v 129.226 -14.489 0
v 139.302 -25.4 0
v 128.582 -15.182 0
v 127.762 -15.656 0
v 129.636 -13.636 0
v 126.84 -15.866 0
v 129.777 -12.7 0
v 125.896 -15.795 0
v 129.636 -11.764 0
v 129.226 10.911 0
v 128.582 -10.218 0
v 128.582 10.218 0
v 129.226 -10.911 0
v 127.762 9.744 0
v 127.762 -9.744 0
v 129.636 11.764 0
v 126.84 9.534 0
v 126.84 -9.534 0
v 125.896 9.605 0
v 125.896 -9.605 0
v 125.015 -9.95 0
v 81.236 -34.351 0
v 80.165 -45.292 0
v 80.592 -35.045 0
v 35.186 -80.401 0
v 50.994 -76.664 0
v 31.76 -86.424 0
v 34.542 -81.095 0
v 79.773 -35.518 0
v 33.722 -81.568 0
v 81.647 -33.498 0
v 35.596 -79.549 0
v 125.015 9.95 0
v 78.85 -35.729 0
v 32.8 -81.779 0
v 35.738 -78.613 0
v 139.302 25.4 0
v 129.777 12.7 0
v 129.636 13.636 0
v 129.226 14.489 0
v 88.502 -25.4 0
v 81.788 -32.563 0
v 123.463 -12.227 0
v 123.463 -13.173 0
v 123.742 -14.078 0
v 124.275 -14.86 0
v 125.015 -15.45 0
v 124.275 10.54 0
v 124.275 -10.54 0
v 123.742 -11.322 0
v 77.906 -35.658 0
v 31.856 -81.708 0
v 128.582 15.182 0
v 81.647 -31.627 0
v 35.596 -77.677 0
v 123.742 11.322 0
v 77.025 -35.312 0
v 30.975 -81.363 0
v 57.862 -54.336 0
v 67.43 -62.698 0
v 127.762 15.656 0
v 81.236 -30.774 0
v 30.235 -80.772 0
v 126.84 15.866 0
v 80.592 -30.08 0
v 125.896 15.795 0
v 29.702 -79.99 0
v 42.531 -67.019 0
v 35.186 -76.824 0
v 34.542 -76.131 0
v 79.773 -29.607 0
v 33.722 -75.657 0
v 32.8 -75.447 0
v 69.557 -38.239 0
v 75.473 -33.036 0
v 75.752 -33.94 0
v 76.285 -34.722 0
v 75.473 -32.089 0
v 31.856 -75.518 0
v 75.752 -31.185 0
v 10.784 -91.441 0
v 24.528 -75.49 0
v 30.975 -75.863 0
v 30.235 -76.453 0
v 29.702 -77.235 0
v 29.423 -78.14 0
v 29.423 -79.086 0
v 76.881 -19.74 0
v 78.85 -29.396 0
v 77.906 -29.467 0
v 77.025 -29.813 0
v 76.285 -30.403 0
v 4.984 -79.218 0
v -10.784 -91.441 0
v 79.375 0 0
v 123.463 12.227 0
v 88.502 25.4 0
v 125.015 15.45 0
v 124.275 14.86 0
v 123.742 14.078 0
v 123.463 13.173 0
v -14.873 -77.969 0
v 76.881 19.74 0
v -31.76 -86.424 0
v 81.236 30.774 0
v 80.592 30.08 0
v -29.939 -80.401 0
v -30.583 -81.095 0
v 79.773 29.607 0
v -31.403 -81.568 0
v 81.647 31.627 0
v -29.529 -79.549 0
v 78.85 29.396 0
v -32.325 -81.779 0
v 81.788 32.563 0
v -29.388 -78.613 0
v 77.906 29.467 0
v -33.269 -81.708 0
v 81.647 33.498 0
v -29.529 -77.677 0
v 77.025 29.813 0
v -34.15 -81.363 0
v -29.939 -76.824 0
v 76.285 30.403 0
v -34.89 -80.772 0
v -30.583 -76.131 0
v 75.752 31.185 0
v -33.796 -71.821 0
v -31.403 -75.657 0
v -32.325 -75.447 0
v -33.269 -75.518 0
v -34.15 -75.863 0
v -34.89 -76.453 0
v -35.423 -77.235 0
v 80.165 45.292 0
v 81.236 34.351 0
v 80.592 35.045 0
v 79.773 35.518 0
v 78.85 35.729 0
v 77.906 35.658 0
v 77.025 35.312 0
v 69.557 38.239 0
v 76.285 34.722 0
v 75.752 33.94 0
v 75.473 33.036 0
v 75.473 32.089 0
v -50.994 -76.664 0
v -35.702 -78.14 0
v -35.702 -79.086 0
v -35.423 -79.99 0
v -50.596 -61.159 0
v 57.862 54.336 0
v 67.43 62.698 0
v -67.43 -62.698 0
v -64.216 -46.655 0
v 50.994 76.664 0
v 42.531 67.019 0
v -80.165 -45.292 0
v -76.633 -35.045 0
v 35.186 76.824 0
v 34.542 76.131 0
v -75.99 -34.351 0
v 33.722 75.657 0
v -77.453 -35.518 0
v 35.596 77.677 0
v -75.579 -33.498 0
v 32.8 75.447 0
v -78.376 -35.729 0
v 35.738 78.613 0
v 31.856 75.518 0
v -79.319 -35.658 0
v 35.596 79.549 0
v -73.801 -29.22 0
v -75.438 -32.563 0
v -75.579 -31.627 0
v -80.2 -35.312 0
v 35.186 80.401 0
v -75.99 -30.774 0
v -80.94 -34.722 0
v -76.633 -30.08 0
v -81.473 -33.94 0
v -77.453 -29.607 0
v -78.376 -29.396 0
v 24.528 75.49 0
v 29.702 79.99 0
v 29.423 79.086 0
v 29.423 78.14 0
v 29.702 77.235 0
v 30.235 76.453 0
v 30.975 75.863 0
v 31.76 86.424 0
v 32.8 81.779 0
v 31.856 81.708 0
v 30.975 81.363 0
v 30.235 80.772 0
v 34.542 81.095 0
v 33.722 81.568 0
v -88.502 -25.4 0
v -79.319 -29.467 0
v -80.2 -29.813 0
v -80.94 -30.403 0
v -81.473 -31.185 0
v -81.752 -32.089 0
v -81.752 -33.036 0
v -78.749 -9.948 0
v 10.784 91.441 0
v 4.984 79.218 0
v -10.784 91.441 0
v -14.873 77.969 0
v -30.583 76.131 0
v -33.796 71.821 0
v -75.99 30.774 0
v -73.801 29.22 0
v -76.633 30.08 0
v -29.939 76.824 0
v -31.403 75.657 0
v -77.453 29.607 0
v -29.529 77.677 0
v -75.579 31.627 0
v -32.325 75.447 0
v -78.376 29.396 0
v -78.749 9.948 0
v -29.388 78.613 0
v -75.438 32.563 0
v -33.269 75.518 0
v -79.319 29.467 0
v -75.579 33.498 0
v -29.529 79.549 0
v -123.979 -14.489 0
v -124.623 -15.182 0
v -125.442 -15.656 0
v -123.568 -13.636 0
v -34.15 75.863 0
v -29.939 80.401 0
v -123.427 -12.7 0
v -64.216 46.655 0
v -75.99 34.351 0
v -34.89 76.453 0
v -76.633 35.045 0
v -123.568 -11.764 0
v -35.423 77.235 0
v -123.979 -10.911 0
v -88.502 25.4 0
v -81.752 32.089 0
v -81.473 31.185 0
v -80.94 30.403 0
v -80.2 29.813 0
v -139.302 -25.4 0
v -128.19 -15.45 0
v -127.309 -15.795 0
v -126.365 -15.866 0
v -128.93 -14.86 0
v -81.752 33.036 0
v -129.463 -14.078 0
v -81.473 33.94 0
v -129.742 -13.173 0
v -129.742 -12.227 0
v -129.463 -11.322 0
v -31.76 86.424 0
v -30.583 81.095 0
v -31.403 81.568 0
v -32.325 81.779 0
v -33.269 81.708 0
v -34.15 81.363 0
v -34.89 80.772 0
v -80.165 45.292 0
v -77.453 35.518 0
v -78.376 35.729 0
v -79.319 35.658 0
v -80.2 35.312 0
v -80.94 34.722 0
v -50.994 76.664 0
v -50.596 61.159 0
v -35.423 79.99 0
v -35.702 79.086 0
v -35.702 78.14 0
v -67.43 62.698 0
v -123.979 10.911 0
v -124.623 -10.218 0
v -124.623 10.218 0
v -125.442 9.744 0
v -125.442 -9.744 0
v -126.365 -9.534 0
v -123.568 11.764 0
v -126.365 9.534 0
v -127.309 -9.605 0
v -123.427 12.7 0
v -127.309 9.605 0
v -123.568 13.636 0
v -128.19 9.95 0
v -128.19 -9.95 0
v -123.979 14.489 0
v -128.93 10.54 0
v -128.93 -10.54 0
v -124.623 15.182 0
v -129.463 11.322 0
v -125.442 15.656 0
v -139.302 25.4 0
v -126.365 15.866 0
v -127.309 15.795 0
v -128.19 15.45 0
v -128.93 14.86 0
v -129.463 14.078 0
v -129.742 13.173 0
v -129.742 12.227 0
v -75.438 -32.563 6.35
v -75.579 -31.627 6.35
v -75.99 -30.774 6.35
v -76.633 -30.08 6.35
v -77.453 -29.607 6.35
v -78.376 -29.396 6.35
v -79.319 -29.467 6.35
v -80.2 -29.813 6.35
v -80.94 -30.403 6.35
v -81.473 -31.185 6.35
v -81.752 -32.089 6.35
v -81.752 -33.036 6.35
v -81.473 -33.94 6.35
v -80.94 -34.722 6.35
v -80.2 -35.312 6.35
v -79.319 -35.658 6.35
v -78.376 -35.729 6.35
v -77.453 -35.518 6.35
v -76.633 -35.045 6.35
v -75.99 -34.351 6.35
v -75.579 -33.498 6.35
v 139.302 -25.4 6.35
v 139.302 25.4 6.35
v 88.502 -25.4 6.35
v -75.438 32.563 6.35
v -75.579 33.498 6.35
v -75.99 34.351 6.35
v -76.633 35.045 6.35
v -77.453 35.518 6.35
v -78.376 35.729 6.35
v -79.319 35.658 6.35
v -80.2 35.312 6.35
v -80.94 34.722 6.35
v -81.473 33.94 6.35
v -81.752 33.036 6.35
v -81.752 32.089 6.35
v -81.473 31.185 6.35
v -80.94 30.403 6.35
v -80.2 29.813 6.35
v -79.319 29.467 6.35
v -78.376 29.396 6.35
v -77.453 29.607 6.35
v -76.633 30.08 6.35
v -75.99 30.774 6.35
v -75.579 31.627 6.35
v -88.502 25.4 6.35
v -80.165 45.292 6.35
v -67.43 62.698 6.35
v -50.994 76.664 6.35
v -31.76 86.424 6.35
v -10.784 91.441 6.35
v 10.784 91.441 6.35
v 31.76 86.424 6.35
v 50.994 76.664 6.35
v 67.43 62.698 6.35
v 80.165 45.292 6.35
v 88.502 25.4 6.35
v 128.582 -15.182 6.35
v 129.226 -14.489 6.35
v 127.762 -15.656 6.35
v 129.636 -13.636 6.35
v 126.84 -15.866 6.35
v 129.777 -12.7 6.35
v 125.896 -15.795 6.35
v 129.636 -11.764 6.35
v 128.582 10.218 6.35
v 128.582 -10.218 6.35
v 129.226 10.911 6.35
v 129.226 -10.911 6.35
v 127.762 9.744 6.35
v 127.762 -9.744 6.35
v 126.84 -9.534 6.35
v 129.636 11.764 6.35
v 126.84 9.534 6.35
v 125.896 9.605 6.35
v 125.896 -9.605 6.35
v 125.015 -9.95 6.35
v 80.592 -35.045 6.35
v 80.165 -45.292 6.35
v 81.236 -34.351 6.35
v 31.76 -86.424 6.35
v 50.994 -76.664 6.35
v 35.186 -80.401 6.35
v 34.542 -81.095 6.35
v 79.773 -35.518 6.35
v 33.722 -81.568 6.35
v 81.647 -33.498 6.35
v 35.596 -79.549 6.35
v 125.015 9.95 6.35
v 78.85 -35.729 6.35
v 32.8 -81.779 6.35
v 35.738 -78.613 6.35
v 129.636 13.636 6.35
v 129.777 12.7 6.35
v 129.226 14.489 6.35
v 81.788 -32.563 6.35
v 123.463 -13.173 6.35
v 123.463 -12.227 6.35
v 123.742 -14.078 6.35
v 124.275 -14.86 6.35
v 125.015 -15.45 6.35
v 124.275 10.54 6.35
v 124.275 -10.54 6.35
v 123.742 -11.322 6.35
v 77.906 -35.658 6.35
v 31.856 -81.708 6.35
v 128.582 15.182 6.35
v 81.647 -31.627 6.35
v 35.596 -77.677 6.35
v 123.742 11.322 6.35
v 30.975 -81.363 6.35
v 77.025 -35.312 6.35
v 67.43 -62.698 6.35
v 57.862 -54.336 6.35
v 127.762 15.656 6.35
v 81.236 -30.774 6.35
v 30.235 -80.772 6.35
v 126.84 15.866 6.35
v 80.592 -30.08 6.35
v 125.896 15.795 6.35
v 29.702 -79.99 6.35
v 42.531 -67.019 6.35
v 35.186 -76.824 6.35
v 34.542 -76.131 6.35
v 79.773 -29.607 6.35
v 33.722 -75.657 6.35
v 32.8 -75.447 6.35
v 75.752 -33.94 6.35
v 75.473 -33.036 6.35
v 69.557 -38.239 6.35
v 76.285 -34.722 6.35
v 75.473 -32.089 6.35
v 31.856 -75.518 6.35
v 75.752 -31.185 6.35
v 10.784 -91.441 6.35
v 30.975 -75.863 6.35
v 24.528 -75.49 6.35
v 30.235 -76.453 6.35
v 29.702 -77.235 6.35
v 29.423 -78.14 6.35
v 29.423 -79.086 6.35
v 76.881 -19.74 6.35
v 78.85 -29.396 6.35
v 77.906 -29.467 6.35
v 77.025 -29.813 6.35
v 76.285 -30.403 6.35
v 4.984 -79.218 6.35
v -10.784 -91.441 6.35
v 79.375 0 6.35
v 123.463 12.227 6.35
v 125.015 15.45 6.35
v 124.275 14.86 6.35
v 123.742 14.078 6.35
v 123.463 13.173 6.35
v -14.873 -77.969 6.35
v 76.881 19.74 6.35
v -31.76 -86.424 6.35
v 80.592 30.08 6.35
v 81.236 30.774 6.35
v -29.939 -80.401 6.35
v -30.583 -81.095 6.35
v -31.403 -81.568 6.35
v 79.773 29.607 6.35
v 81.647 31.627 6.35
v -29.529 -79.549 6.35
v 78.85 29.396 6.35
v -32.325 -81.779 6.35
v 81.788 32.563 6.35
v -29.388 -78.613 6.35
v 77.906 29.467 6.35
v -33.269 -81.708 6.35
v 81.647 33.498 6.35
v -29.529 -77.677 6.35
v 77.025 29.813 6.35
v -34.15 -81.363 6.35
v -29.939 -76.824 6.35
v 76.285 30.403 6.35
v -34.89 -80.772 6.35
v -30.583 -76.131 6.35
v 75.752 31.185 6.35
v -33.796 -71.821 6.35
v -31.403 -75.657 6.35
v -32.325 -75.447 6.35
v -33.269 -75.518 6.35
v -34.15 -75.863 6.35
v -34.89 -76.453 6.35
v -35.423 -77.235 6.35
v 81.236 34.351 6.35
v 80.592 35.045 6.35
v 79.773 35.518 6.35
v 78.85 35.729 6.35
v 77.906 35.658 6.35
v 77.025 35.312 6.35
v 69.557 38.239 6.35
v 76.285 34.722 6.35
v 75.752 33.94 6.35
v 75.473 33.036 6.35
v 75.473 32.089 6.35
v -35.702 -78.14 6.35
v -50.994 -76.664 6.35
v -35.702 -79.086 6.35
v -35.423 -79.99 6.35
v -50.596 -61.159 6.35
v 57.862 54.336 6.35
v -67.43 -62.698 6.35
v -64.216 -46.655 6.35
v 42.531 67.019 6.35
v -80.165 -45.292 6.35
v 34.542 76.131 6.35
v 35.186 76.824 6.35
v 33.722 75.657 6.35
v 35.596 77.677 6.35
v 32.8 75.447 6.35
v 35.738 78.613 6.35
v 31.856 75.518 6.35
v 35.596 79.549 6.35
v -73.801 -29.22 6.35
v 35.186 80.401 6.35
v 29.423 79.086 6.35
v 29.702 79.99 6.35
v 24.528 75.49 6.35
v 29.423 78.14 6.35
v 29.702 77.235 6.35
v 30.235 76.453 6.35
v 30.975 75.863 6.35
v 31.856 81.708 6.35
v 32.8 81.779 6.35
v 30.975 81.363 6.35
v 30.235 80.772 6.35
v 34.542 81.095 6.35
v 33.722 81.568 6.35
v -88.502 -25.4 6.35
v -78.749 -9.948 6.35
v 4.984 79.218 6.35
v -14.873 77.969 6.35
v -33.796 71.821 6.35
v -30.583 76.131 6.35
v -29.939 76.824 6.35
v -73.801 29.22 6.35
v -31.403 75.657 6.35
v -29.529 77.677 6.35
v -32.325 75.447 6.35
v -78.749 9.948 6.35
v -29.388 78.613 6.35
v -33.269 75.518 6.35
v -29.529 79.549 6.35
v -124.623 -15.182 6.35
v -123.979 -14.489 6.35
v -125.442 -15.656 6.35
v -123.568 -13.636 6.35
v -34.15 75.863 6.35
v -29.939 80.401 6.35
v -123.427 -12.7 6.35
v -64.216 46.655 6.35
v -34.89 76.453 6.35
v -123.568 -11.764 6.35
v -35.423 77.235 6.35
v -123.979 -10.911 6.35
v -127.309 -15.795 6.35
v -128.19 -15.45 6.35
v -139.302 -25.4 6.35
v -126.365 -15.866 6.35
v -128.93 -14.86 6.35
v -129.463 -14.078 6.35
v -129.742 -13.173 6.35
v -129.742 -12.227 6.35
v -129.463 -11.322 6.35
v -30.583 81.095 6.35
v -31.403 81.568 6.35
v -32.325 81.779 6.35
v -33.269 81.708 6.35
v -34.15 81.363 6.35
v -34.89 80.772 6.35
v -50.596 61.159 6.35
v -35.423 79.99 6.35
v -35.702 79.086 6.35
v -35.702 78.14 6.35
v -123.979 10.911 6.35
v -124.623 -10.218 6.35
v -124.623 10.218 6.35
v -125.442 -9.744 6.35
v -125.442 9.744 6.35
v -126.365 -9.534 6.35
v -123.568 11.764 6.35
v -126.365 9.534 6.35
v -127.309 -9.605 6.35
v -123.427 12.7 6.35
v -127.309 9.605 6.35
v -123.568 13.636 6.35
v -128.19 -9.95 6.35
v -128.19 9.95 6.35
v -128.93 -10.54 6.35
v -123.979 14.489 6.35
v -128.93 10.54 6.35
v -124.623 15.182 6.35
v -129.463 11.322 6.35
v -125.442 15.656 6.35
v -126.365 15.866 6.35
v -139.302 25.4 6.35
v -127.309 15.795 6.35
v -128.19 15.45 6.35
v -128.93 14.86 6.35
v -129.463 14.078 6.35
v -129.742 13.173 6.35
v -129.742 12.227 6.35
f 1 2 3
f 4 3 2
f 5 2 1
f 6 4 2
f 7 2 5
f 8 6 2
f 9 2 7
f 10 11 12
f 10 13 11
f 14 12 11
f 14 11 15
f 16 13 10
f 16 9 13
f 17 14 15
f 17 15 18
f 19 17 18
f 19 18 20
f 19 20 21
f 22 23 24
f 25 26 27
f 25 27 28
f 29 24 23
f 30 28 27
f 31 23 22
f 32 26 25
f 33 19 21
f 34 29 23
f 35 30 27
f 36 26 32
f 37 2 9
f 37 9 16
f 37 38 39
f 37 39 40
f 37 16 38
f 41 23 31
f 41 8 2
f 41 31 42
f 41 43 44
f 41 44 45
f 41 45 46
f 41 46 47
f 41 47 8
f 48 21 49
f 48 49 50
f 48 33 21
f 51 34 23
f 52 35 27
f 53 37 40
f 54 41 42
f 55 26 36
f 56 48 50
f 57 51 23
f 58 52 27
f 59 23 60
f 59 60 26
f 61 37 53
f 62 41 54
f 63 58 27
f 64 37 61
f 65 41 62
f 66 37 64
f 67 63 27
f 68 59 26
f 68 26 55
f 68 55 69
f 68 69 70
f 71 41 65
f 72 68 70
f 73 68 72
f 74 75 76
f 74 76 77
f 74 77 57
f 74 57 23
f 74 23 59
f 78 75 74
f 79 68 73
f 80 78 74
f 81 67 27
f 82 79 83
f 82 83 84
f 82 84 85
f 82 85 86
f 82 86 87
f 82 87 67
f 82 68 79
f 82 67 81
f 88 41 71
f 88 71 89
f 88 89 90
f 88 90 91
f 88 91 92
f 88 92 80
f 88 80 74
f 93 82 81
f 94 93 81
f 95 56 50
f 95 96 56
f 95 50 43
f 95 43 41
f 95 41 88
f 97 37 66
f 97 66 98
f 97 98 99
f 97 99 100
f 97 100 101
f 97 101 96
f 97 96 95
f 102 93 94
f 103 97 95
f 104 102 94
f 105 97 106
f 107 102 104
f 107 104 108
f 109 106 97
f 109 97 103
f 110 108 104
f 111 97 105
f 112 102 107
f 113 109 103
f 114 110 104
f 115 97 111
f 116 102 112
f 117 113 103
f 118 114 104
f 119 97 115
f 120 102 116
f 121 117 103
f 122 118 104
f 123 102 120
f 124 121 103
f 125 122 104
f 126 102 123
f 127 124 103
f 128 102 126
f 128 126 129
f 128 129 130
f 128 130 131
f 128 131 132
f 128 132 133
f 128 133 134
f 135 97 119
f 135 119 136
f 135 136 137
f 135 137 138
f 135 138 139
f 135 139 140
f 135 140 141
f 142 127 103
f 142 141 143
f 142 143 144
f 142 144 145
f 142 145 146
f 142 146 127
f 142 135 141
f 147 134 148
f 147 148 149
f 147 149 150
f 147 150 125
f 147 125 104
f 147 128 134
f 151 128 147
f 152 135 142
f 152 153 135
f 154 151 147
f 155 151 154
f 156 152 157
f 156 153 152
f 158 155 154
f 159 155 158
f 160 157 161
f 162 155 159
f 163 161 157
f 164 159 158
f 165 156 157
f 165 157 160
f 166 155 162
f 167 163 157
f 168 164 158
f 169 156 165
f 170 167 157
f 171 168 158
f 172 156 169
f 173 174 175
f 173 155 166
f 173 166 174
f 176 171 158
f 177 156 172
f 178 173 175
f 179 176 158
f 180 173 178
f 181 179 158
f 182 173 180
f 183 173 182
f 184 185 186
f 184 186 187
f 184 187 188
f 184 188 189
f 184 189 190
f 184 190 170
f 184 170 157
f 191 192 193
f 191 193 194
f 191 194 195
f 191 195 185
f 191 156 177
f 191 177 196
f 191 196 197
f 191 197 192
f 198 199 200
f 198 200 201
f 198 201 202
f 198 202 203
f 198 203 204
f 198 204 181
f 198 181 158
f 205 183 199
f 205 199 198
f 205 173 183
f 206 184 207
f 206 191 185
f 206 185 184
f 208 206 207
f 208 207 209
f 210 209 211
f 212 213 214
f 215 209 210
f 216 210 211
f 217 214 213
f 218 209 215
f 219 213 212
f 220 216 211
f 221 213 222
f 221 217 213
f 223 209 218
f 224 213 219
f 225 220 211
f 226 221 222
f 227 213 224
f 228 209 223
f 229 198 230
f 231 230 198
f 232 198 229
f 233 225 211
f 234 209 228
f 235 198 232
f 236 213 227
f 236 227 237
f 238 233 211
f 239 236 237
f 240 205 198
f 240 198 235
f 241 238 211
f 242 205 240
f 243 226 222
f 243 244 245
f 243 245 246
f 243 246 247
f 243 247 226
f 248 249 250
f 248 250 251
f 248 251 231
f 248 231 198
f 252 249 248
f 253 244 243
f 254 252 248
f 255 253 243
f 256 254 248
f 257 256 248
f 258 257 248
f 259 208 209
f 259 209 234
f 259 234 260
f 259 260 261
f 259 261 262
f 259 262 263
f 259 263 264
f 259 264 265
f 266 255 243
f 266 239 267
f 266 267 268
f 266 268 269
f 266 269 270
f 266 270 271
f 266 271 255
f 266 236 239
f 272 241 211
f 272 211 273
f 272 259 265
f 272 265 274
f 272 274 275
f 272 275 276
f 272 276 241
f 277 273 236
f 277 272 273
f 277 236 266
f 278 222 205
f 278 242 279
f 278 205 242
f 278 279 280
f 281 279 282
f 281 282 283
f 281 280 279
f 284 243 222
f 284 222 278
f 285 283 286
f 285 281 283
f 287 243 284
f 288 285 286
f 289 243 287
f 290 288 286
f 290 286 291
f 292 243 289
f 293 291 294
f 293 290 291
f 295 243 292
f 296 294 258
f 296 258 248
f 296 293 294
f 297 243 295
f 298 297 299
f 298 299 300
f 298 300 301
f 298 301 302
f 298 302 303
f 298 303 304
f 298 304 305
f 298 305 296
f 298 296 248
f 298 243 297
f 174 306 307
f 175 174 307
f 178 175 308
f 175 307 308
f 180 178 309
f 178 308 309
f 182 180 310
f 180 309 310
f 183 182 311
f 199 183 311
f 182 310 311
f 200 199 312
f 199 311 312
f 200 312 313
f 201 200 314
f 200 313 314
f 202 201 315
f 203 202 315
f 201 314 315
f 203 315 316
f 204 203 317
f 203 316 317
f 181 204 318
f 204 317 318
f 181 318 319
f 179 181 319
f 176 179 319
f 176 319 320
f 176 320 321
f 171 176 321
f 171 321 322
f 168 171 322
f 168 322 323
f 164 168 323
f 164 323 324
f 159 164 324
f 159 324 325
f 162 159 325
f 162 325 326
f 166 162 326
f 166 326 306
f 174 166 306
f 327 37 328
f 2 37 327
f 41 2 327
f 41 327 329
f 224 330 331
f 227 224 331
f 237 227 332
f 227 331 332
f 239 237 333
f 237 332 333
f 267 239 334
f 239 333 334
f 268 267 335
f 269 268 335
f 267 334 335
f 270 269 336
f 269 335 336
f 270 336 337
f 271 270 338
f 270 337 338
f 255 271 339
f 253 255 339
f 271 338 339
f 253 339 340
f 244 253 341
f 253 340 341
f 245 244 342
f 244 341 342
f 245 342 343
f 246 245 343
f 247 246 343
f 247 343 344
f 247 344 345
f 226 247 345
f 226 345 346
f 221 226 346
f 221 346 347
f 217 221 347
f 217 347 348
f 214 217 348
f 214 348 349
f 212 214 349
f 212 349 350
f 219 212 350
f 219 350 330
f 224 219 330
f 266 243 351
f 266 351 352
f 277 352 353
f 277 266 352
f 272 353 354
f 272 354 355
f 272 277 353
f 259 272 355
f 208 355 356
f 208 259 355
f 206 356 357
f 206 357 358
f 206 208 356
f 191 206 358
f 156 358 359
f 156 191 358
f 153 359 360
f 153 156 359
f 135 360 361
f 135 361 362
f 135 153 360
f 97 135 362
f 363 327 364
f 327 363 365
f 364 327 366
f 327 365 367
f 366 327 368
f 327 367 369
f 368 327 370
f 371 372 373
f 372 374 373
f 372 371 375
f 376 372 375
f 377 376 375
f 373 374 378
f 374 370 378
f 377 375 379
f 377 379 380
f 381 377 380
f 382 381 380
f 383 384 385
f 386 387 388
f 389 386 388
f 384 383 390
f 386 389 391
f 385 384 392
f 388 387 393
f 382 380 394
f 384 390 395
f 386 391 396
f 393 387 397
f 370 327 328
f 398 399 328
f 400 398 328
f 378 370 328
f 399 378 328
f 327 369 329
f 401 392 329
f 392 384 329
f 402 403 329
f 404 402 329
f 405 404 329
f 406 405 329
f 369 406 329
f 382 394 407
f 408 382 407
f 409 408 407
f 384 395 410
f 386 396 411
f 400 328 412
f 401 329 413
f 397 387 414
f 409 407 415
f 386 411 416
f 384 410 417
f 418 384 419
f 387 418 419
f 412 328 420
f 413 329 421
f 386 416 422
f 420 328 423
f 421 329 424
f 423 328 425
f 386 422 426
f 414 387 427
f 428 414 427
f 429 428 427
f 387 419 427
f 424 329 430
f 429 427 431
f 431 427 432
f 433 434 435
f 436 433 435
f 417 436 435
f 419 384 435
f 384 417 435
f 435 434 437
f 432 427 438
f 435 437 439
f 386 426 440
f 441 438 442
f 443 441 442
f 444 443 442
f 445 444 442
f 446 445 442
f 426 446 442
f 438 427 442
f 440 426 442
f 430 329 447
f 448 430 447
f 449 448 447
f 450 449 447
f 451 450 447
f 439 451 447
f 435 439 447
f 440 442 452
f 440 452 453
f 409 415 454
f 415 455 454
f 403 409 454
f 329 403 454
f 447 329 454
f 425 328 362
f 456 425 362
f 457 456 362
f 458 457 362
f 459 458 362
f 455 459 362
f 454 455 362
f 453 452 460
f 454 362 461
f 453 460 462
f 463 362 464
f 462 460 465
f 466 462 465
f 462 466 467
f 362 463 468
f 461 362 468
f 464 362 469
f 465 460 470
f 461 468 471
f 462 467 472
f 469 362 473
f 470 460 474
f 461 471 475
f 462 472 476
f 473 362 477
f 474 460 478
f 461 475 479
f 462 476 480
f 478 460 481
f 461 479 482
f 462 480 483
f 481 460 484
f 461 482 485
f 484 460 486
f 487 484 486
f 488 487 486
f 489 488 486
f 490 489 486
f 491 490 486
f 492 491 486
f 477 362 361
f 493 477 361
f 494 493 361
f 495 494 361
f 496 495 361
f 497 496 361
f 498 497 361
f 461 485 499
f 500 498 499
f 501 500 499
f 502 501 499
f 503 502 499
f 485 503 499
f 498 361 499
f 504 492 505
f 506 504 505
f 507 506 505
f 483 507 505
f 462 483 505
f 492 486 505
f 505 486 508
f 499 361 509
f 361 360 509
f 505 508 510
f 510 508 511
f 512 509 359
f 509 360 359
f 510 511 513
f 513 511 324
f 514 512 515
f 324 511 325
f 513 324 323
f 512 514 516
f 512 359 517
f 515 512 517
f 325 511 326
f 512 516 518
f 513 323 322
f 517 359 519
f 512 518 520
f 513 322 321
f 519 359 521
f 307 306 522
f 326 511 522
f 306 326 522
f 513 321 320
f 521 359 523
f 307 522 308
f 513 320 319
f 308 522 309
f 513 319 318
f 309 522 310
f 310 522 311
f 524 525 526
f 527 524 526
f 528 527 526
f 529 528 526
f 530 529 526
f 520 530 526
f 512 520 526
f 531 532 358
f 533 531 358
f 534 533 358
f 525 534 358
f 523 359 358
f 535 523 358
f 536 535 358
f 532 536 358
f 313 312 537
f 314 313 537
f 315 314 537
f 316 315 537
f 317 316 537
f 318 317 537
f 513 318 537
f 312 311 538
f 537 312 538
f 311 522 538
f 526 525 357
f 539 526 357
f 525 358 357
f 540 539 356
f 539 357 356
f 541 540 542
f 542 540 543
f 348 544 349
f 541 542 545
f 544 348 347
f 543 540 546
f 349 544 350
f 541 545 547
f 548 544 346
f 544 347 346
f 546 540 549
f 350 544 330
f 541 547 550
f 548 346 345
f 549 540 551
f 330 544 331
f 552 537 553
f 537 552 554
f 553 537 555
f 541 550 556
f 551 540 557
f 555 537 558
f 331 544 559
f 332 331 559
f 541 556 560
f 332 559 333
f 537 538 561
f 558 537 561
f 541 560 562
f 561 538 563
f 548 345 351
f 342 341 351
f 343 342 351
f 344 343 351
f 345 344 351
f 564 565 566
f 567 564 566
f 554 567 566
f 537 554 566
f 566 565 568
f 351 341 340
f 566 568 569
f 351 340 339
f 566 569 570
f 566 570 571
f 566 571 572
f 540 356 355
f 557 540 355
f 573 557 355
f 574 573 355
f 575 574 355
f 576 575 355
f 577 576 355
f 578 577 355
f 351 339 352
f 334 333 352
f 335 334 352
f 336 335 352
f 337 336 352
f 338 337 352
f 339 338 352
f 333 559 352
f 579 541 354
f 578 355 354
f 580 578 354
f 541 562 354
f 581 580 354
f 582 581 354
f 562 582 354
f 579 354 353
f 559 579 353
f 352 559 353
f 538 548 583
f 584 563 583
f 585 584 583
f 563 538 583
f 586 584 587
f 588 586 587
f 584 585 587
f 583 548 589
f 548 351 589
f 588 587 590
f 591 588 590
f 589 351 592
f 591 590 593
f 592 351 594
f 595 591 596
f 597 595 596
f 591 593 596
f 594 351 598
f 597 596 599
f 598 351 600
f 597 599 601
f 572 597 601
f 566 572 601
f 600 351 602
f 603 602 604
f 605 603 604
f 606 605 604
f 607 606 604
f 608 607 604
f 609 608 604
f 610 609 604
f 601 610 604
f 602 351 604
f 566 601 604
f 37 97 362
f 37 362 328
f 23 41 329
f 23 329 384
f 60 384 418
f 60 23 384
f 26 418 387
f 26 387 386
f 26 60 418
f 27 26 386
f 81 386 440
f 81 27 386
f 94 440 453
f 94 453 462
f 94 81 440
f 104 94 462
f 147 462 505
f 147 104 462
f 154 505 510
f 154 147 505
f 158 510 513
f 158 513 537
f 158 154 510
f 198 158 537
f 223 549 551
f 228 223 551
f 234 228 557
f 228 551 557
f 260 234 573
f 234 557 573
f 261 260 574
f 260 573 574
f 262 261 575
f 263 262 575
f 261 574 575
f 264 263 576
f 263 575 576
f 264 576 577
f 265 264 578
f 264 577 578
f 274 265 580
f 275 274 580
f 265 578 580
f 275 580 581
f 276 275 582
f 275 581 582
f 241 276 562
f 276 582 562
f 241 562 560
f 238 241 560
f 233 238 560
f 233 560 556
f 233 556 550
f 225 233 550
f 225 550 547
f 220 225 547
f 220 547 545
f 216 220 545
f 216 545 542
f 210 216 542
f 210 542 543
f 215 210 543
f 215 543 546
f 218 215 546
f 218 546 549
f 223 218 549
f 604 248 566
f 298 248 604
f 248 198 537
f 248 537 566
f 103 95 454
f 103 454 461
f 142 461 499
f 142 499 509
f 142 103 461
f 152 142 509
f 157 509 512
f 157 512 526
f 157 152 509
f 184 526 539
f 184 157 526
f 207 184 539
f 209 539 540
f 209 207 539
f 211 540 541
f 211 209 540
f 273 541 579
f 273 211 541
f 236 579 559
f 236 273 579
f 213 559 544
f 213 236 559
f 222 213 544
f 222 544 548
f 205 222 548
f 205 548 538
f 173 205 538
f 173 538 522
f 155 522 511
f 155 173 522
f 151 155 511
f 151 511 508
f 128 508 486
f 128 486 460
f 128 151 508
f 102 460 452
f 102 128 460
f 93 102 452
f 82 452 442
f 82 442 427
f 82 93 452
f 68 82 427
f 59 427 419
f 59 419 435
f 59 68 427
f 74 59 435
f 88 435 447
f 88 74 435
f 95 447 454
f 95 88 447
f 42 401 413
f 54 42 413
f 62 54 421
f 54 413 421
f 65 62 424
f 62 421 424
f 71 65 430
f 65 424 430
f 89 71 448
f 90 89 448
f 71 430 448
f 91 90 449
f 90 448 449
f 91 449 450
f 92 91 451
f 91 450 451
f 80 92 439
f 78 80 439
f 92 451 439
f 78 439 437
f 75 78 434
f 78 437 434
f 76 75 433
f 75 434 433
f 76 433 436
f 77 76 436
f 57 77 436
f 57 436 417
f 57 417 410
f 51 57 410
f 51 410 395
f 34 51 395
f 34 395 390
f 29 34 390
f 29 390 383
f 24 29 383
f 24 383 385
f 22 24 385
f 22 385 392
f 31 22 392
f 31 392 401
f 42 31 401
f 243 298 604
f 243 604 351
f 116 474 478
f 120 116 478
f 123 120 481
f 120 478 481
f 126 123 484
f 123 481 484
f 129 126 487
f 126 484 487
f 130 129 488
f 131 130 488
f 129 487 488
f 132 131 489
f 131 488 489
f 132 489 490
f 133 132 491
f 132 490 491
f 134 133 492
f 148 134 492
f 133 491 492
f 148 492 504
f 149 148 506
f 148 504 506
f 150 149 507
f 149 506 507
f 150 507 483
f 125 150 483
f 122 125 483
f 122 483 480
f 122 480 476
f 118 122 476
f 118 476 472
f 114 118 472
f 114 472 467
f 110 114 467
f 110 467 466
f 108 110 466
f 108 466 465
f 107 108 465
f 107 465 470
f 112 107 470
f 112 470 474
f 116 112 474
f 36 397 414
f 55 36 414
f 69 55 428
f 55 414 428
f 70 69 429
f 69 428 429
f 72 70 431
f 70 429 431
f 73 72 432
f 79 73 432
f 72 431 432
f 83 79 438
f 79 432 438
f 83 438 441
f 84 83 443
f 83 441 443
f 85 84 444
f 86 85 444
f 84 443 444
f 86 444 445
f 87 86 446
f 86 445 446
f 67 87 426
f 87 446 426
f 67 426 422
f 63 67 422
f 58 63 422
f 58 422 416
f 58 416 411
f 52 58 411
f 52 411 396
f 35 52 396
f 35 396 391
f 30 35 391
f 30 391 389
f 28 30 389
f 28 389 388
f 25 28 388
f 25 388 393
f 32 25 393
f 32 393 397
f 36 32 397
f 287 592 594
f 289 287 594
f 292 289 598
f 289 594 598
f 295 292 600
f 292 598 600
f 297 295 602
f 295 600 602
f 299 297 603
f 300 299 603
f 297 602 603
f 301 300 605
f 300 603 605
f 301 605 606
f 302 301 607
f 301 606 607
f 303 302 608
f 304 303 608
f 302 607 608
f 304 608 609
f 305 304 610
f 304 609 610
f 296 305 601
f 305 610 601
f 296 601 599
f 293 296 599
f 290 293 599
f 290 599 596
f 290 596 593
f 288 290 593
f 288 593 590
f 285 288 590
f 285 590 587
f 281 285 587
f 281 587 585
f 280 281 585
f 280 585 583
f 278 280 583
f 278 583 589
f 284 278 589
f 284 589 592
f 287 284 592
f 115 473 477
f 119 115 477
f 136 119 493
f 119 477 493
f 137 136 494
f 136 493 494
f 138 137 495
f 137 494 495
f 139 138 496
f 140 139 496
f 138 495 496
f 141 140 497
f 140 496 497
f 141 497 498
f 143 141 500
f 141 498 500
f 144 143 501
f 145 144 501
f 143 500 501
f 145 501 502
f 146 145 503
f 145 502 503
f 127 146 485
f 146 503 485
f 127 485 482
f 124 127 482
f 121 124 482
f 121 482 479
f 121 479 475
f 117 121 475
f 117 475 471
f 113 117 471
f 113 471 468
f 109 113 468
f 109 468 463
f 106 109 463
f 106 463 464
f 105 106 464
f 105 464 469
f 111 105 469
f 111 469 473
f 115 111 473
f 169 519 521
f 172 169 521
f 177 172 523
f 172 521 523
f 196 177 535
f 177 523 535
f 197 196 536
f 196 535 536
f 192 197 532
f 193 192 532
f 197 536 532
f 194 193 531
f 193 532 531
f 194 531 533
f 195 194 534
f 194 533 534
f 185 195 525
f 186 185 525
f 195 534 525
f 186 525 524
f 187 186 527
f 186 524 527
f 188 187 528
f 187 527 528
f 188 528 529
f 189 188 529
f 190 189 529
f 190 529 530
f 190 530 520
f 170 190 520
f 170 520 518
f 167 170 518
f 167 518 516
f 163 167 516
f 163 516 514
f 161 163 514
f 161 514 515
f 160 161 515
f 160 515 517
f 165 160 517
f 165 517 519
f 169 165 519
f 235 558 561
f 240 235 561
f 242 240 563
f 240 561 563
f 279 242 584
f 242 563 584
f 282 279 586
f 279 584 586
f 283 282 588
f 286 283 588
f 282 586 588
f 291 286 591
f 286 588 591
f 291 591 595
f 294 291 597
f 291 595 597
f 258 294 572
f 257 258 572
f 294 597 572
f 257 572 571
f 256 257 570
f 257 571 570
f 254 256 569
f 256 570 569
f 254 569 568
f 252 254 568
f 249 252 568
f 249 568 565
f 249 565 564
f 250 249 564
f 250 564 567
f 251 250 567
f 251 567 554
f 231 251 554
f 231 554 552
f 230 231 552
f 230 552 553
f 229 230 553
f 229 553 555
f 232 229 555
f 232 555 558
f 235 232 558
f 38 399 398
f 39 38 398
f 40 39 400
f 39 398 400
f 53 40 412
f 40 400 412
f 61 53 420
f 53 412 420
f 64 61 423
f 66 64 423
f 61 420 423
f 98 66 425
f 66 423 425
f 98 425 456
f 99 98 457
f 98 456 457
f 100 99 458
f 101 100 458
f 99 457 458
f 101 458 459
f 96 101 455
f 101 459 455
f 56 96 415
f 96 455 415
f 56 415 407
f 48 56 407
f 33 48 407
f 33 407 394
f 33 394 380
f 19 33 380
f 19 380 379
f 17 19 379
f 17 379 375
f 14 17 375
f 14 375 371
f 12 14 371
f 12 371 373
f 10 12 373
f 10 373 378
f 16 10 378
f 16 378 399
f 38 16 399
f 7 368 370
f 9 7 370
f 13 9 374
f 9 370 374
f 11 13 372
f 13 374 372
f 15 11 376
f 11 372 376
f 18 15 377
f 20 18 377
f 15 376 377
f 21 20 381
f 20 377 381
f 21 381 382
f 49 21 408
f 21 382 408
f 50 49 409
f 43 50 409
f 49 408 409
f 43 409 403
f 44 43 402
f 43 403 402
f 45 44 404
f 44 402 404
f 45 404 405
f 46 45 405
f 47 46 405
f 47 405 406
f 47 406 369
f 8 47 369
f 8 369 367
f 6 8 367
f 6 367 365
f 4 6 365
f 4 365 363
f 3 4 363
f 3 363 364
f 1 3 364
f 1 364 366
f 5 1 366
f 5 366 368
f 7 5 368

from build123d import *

# Parameters (mm, degrees)
SKETCH1_R           = 79.375
BOSS_EXTRUDE1_DEPTH = 6.35
SKETCH2_R           = 3.175
CUT_EXTRUDE1_DEPTH  = 76.2


with BuildPart() as part:
    # Sketch1 → Boss-Extrude1 (new body)
    with BuildSketch(Plane.XY):
        with BuildLine():
            Line((-139.302235141, 25.4), (-88.502235141, 25.4))
            ThreePointArc((-88.502235141, 25.4), (0, 92.075), (88.502235141, 25.4))
            Line((88.502235141, 25.4), (139.302235141, 25.4))
            Line((139.302235141, 25.4), (139.302235141, -25.4))
            Line((139.302235141, -25.4), (88.502235141, -25.4))
            ThreePointArc((88.502235141, -25.4), (0, -92.075), (-88.502235141, -25.4))
            Line((-88.502235141, -25.4), (-139.302235141, -25.4))
            Line((-139.302235141, -25.4), (-139.302235141, 25.4))
        make_face()
        Circle(SKETCH1_R, mode=Mode.SUBTRACT)
    extrude(amount=BOSS_EXTRUDE1_DEPTH)

    # Sketch2 → Cut-Extrude1 (cut)
    with BuildSketch(Plane.XY.offset(6.35)):
        with Locations((-126.602235141, -12.7)):
            Circle(SKETCH2_R)
        with Locations((-78.612909421, -32.56253326)):
            Circle(SKETCH2_R)
        with Locations((78.612909421, -32.56253326)):
            Circle(SKETCH2_R)
        with Locations((126.602235141, 12.7)):
            Circle(SKETCH2_R)
        with Locations((126.602235141, -12.7)):
            Circle(SKETCH2_R)
        with Locations((78.612909421, 32.56253326)):
            Circle(SKETCH2_R)
        with Locations((32.56253326, 78.612909421)):
            Circle(SKETCH2_R)
        with Locations((-126.602235141, 12.7)):
            Circle(SKETCH2_R)
        with Locations((-32.56253326, -78.612909421)):
            Circle(SKETCH2_R)
        with Locations((32.56253326, -78.612909421)):
            Circle(SKETCH2_R)
        with Locations((-32.56253326, 78.612909421)):
            Circle(SKETCH2_R)
        with Locations((-78.612909421, 32.56253326)):
            Circle(SKETCH2_R)
    extrude(amount=-CUT_EXTRUDE1_DEPTH, mode=Mode.SUBTRACT)


solid = part.part
